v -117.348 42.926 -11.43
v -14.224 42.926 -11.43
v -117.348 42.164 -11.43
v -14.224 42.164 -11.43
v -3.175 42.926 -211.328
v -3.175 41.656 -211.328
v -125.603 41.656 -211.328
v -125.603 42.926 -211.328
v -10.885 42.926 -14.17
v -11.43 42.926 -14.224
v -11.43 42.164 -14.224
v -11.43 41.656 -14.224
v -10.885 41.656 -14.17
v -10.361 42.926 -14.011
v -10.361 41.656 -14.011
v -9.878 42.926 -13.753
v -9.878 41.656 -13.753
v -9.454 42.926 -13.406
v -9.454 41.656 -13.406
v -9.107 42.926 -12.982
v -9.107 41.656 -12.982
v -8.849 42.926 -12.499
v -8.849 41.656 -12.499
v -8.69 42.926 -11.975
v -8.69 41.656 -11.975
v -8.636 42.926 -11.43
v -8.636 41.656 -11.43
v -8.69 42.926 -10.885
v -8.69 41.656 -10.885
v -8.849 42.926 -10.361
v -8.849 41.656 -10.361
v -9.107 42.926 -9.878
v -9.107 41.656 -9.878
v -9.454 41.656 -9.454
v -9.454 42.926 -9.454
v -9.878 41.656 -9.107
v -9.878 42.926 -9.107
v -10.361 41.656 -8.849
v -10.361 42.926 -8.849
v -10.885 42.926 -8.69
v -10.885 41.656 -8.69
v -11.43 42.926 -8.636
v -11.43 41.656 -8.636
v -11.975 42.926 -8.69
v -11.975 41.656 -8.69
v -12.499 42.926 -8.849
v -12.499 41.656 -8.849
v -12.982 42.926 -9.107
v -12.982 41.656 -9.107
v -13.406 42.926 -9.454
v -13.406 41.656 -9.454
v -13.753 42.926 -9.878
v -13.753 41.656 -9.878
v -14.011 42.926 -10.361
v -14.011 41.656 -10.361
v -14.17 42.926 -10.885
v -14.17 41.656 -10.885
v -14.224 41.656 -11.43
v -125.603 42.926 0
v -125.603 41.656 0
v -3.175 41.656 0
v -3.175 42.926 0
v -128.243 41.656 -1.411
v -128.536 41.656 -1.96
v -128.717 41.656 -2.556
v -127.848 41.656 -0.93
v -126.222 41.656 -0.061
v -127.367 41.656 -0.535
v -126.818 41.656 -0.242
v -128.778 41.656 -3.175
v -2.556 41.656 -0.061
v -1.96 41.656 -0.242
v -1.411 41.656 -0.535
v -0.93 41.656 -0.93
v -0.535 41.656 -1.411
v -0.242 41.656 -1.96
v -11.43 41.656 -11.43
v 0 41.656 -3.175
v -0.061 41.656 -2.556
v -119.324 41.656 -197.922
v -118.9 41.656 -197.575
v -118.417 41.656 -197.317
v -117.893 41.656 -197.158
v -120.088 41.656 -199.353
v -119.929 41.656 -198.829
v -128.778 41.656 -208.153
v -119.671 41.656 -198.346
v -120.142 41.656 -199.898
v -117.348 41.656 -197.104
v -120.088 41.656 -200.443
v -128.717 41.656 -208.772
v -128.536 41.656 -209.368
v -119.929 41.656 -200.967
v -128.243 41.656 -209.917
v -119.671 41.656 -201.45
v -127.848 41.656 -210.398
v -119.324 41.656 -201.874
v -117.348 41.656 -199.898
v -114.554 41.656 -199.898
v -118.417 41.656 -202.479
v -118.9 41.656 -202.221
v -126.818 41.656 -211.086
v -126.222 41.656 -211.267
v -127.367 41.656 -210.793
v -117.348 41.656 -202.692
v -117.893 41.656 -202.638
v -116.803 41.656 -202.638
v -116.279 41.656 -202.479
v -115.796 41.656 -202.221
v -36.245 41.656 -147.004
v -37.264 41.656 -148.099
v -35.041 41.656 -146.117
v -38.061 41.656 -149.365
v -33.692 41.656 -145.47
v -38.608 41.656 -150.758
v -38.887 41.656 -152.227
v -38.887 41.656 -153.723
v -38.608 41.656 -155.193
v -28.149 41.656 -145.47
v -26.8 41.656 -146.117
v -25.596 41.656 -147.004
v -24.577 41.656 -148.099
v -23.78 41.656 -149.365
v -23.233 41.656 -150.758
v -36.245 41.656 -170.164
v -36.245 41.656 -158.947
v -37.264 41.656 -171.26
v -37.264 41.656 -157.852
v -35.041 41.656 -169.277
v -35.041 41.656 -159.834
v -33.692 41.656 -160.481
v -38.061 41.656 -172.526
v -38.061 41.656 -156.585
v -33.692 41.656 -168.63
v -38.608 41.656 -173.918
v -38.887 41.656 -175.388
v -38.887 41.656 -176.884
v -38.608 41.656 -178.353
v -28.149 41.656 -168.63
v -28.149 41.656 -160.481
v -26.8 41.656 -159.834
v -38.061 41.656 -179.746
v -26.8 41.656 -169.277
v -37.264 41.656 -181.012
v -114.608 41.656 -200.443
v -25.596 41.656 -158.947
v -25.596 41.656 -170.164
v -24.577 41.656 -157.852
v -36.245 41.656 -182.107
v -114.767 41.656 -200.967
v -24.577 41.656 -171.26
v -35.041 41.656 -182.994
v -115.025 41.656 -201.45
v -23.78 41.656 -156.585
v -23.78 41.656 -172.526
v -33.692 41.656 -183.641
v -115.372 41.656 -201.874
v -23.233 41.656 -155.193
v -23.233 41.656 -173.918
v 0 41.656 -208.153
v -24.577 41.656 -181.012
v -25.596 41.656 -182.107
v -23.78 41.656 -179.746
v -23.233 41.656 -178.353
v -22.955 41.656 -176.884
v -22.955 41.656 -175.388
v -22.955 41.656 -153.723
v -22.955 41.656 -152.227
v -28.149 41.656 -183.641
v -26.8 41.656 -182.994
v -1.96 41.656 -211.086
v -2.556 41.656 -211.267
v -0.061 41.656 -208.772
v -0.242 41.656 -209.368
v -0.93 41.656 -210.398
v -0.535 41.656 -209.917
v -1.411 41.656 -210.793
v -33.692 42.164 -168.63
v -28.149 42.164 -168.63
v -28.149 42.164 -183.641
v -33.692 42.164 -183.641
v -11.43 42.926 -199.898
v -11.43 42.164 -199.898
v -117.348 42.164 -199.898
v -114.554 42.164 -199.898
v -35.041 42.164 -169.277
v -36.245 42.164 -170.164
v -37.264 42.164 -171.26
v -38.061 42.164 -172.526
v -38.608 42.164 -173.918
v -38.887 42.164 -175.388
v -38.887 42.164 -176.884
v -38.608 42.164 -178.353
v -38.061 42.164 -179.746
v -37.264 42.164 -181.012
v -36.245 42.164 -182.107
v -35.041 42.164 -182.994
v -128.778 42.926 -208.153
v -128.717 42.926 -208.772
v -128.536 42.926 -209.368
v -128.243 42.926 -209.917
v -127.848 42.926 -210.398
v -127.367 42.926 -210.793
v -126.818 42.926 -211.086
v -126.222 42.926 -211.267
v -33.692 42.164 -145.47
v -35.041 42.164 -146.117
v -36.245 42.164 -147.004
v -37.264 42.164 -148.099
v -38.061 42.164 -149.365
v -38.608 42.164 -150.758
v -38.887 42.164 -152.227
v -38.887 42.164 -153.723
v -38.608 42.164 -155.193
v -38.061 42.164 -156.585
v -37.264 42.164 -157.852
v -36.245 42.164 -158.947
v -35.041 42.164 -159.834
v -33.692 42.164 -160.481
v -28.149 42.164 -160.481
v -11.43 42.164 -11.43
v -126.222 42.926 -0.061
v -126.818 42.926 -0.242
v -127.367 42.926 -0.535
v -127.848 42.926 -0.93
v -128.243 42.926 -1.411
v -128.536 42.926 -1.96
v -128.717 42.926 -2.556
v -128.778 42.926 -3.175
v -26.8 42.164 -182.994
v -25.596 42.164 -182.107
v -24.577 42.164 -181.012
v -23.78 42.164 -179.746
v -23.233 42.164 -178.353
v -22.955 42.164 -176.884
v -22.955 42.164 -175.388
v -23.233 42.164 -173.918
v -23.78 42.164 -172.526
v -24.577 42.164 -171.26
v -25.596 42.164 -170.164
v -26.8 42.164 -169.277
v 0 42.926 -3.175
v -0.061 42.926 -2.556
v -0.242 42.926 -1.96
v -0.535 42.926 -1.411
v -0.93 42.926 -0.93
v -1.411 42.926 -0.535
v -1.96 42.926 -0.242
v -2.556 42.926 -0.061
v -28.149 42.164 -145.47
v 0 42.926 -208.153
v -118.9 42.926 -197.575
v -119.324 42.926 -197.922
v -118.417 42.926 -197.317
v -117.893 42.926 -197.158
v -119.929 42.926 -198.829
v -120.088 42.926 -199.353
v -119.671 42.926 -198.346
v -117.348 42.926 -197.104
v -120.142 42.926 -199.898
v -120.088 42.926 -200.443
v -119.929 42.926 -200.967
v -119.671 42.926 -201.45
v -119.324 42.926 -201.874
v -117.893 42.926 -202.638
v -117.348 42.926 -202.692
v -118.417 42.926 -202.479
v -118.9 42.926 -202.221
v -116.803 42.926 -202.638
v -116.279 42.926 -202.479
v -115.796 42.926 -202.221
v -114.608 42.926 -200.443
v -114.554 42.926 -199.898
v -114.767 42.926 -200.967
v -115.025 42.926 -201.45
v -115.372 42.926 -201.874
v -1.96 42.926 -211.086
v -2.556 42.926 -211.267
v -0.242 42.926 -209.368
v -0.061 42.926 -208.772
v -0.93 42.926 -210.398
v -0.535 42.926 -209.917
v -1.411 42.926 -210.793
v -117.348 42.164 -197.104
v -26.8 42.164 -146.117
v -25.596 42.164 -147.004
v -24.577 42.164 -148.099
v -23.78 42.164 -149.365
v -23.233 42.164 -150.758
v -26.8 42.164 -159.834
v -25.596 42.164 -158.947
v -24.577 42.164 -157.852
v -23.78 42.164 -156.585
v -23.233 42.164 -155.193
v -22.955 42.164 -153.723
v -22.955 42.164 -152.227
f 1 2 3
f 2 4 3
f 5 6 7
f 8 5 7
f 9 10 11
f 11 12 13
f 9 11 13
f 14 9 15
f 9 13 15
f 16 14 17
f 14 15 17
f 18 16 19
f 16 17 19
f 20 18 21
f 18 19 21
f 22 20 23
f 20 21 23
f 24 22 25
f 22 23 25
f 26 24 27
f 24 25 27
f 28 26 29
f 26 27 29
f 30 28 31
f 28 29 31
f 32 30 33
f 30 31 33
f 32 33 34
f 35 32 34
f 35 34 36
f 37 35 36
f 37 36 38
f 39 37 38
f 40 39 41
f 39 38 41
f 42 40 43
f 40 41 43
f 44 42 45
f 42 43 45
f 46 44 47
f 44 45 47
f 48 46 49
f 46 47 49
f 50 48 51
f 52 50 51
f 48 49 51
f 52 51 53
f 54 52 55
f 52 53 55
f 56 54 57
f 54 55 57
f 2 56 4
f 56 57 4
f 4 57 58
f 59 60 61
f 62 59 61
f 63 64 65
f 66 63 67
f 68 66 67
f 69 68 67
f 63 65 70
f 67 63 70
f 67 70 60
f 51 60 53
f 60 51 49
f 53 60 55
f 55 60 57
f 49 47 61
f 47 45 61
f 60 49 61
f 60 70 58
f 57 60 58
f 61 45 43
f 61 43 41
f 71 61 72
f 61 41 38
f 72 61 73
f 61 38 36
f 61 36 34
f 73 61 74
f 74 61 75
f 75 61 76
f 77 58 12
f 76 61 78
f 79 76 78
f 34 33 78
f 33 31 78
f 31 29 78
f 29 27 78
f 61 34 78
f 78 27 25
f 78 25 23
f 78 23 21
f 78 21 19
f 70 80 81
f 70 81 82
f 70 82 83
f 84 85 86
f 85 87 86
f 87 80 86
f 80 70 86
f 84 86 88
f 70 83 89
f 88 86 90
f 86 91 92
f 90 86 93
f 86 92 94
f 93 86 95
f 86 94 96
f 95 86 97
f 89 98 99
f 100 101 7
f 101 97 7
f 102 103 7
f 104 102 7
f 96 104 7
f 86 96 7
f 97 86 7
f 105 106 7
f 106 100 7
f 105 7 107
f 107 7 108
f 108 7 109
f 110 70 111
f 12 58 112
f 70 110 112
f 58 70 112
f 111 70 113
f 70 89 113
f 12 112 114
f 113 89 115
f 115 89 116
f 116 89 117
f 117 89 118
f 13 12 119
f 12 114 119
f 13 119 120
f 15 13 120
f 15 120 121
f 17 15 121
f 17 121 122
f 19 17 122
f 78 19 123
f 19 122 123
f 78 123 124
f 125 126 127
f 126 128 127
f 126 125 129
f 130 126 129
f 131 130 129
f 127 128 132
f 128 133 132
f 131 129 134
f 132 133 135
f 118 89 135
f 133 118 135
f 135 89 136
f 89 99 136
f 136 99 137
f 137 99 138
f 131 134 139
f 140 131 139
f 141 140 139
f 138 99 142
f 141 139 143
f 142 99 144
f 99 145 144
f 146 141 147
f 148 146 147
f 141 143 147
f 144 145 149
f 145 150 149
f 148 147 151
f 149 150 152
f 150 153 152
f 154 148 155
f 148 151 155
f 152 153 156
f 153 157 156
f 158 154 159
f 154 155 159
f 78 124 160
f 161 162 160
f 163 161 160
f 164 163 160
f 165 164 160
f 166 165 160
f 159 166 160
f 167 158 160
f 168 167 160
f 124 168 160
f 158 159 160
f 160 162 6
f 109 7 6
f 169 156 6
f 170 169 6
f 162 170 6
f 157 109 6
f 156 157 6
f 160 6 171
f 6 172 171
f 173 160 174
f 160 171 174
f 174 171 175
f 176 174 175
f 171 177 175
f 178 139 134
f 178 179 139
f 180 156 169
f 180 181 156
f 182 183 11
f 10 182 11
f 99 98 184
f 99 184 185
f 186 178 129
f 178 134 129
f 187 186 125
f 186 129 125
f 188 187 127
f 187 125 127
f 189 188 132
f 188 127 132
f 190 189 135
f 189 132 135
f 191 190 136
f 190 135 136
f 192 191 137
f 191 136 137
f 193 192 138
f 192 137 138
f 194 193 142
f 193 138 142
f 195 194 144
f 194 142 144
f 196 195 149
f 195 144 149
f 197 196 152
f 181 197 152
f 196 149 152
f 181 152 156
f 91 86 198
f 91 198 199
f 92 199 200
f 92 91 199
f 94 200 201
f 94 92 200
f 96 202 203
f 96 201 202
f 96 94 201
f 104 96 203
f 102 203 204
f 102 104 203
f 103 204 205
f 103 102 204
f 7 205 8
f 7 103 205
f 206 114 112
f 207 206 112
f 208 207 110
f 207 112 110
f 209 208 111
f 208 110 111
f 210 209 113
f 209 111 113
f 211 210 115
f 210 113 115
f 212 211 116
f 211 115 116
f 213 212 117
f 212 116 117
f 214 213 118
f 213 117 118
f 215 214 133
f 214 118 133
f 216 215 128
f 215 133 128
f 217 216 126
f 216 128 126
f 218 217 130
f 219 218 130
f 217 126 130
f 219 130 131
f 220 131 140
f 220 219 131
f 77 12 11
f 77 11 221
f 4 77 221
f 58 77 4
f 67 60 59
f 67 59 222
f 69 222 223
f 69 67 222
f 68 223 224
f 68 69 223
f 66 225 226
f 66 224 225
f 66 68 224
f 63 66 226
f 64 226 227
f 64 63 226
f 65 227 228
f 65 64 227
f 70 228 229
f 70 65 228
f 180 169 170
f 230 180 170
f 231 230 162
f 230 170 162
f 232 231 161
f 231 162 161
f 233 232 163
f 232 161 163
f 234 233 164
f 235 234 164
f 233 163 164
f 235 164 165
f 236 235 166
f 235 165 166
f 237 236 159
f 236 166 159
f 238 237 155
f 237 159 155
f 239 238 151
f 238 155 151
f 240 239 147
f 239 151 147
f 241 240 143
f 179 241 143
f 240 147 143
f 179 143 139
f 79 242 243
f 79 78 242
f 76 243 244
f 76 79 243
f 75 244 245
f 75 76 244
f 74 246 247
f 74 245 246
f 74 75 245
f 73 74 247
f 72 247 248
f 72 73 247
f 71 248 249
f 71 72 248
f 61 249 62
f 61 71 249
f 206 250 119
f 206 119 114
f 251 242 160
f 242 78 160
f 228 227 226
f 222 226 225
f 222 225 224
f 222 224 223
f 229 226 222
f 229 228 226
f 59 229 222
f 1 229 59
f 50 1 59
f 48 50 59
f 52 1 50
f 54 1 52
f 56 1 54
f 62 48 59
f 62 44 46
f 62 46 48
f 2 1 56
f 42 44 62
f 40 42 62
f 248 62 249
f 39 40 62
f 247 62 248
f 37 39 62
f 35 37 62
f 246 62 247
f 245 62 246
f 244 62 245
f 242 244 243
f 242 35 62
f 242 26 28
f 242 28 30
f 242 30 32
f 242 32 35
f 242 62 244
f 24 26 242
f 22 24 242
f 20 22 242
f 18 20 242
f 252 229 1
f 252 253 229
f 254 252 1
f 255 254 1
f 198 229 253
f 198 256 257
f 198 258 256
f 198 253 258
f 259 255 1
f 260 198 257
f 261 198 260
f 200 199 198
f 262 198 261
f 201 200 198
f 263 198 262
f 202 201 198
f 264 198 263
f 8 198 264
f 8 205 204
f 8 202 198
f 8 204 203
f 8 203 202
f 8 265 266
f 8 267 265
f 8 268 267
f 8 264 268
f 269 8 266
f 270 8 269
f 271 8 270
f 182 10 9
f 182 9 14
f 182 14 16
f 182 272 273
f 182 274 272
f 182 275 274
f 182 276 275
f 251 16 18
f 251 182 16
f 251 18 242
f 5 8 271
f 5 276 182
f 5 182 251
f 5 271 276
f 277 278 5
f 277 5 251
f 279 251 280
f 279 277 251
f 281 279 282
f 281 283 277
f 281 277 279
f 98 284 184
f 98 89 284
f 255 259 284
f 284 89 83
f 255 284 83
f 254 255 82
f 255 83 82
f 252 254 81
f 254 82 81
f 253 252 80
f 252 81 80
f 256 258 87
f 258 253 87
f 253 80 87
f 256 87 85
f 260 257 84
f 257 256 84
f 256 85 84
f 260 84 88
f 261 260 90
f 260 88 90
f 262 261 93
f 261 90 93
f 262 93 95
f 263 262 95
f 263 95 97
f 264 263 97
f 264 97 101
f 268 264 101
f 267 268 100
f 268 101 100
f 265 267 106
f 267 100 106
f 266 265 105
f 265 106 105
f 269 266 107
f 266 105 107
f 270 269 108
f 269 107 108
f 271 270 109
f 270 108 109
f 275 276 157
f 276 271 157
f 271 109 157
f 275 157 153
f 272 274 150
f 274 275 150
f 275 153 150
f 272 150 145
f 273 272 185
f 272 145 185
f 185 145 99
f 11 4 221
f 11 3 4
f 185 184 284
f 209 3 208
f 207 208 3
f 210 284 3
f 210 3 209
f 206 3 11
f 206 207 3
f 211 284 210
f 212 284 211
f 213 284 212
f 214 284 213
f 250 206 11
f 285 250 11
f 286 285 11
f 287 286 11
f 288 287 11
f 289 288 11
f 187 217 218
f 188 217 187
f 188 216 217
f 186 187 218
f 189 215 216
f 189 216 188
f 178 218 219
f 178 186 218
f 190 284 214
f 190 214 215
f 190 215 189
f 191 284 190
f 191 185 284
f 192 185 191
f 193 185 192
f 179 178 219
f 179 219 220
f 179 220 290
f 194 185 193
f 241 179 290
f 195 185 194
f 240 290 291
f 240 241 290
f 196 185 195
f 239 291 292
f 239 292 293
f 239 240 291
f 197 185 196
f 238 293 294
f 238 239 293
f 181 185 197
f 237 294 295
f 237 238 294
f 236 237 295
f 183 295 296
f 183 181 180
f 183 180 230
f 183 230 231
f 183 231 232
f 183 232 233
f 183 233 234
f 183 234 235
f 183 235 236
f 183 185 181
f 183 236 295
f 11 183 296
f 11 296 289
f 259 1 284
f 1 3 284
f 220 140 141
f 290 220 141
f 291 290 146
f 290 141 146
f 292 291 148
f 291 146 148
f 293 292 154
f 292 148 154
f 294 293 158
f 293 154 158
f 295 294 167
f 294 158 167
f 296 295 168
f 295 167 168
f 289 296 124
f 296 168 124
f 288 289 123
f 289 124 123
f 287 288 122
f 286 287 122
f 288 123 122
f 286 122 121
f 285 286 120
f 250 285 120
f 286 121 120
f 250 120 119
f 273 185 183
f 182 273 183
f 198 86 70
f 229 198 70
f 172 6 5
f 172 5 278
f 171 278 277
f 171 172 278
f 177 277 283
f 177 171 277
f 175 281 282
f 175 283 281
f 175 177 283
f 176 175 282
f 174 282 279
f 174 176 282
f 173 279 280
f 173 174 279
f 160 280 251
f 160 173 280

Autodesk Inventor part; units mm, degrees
ref_plane "YZ Plane" through (0, 0, 0) normal (1, 0, 0) x (0, 1, 0)
ref_plane "XZ Plane" through (0, 0, 0) normal (0, 1, 0) x (-1, 0, 0)
ref_plane "XY Plane" through (0, 0, 0) normal (0, 0, 1) x (1, 0, 0)
ref_plane "Work Plane1" through (0, 41.656, 0) normal (0, 1, 0) x (1, 0, 0)
sketch "Sketch2" plane through (0, 41.656, 0) normal (0, 1, 0) x (1, 0, 0)
  line L0 (-118.364, 207.264) -> (-10.414, 207.264) projected
  arc A0 (-4.064, 200.914) -> (-10.414, 207.264) centre (-10.414, 200.914) ccw projected
  line L1 (-4.064, 200.914) -> (-4.064, 10.414) projected
  arc A1 (-10.414, 4.064) -> (-4.064, 10.414) centre (-10.414, 10.414) ccw projected
  line L2 (-10.414, 4.064) -> (-118.364, 4.064) projected
  arc A2 (-124.714, 10.414) -> (-118.364, 4.064) centre (-118.364, 10.414) ccw projected
  line L3 (-124.714, 10.414) -> (-124.714, 200.914) projected
  arc A3 (-118.364, 207.264) -> (-124.714, 200.914) centre (-118.364, 200.914) ccw projected
  line L4 (-128.778, 208.153) -> (-128.778, 3.175) projected
  arc A4 (-128.778, 3.175) -> (-125.603, 0) centre (-125.603, 3.175) ccw projected
  line L5 (-125.603, 0) -> (-3.175, 0) projected
  arc A5 (-3.175, 0) -> (0, 3.175) centre (-3.175, 3.175) ccw projected
  line L6 (0, 3.175) -> (0, 208.153) projected
  arc A6 (0, 208.153) -> (-3.175, 211.328) centre (-3.175, 208.153) ccw projected
  line L7 (-3.175, 211.328) -> (-125.603, 211.328) projected
  arc A7 (-125.603, 211.328) -> (-128.778, 208.153) centre (-125.603, 208.153) ccw projected
  circle A8 centre (-117.348, 199.898) radius 2.794 projected
  circle A9 centre (-11.43, 11.43) radius 2.794 projected
  line L8 (-117.348, 199.898) -> (-11.43, 199.898)
  line L9 (-11.43, 199.898) -> (-11.43, 11.43)
  line L10 (-11.43, 11.43) -> (-117.348, 11.43)
  line L11 (-117.348, 11.43) -> (-117.348, 199.898)
  point P0 (0, 0)
extrude "Extrusion5" add sketch "Sketch2" along normal blind 1.27 contours L0 A0 L1 A1 L2 A2 L3 A3 | A7 L7 A6 L6 A5 L5 A4 L4
extrude "Extrusion6" add sketch "Sketch2" along normal blind 0.508 contours L8 L9 A9 L10 L11 A8 | A8 L11 L8 | L9 L10 A9 picked at (-115.5087, 199.6908) picked at (-13.2693, 11.6372)
sketch "Sketch3" plane through (0, 42.164, 0) normal (0, 1, 0) x (1, 0, 0)
  line L0 (-14.224, 11.43) -> (-117.348, 11.43) projected
  line L1 (-114.554, 199.898) -> (-11.43, 199.898) projected
  line L2 (-117.348, 11.43) -> (-62.992, 11.43)
  line L3 (-62.992, 11.43) -> (-62.992, 199.898)
  line L4 (-62.992, 199.898) -> (-117.348, 199.898)
  line L5 (-117.348, 199.898) -> (-117.348, 11.43)
  line L6 (-11.43, 199.898) -> (-62.992, 199.898)
  line L7 (-62.992, 199.898) -> (-62.992, 105.664)
  line L8 (-62.992, 105.664) -> (-11.43, 105.664)
  line L9 (-11.43, 105.664) -> (-11.43, 199.898)
  line L10 (-37.211, 105.664) -> (-62.992, 105.664)
  line L11 (-62.992, 105.664) -> (-62.992, 199.898)
  line L12 (-62.992, 199.898) -> (-37.211, 199.898)
  line L13 (-37.211, 199.898) -> (-37.211, 105.664)
  line L14 (-11.43, 199.898) -> (-11.43, 14.224) projected
  line L15 (-11.43, 199.898) -> (-37.211, 199.898)
  line L16 (-37.211, 199.898) -> (-37.211, 152.781)
  line L17 (-37.211, 152.781) -> (-11.43, 152.781)
  line L18 (-11.43, 152.781) -> (-11.43, 199.898)
  line L19 (-11.43, 105.664) -> (-24.3205, 105.664)
  line L20 (-24.3205, 105.664) -> (-24.3205, 199.898)
  line L21 (-24.3205, 199.898) -> (-11.43, 199.898)
  line L22 (-11.43, 199.898) -> (-11.43, 105.664)
  line L23 (-37.211, 176.3395) -> (-24.3205, 176.3395)
  line L24 (-24.3205, 176.3395) -> (-24.3205, 152.781)
  line L25 (-24.3205, 152.781) -> (-37.211, 152.781)
  line L26 (-37.211, 152.781) -> (-37.211, 176.3395)
  line L27 (-37.211, 105.664) -> (-24.3205, 105.664)
  line L28 (-24.3205, 105.664) -> (-24.3205, 152.781)
  line L29 (-24.3205, 152.781) -> (-37.211, 152.781)
  line L30 (-37.211, 152.781) -> (-37.211, 105.664)
  line L31 (-37.211, 129.2225) -> (-24.3205, 129.2225)
  line L32 (-24.3205, 129.2225) -> (-24.3205, 152.781)
  line L33 (-24.3205, 152.781) -> (-37.211, 152.781)
  line L34 (-37.211, 152.781) -> (-37.211, 129.2225)
  line L35 (-24.3205, 105.664) -> (-30.7657, 105.664)
  line L36 (-30.7657, 105.664) -> (-30.7657, 129.2225)
  line L37 (-30.7657, 129.2225) -> (-24.3205, 129.2225)
  line L38 (-24.3205, 129.2225) -> (-24.3205, 105.664)
  line L39 (-30.7657, 129.2225) -> (-24.3205, 129.2225)
  line L40 (-24.3205, 129.2225) -> (-24.3205, 199.898)
  line L41 (-24.3205, 199.898) -> (-30.7657, 199.898)
  line L42 (-30.7657, 199.898) -> (-30.7657, 129.2225)
  point P0 (0, 0)
sketch "Sketch4" plane through (0, 42.164, 0) normal (0, 1, 0) x (1, 0, 0)
  point P0 (0, 0)
  point P1 (-30.9206, 152.9754)
  point P2 (-30.9206, 176.1357)
hole "Hole1" at (-30.9206, 42.164, -152.9754) at (-30.9206, 42.164, -176.1357) direction (0, -1, 0) diameter 16.002 depth 8.001 tip angle 118
sketch "Sketch5" plane through (0, 42.164, 0) normal (0, 1, 0) x (1, 0, 0)
  circle A0 centre (-30.9206, 152.9754) radius 8.001 projected
  circle A1 centre (-30.9206, 176.1357) radius 8.001 projected
  line L0 (-30.9206, 152.9754) -> (-38.9216, 152.9754)
  line L1 (-30.9206, 152.9754) -> (-22.9196, 152.9754)
  circle A2 centre (-30.9206, 176.1357) radius 8.001 projected
  line L2 (-38.9216, 176.1357) -> (-30.9206, 176.1357)
  line L3 (-30.9206, 176.1357) -> (-22.9196, 176.1357)
  circle A3 centre (-30.9206, 152.9754) radius 7.5057
  circle A4 centre (-30.9206, 176.1357) radius 7.5057
  line L4 (-30.9206, 152.9754) -> (-38.9216, 152.9754)
  line L5 (-38.9216, 152.9754) -> (-38.9216, 160.4811)
  line L6 (-38.9216, 160.4811) -> (-30.9206, 160.4811)
  line L7 (-30.9206, 160.4811) -> (-30.9206, 152.9754)
  line L8 (-30.9206, 152.9754) -> (-22.9196, 152.9754)
  line L9 (-22.9196, 152.9754) -> (-22.9196, 145.4697)
  line L10 (-22.9196, 145.4697) -> (-30.9206, 145.4697)
  line L11 (-30.9206, 145.4697) -> (-30.9206, 152.9754)
  line L12 (-22.9196, 145.4697) -> (-38.9216, 145.4697)
  line L13 (-38.9216, 145.4697) -> (-38.9216, 160.4811)
  line L14 (-38.9216, 160.4811) -> (-22.9196, 160.4811)
  line L15 (-22.9196, 160.4811) -> (-22.9196, 145.4697)
  line L16 (-30.9206, 176.1357) -> (-22.9196, 176.1357)
  line L17 (-22.9196, 176.1357) -> (-22.9196, 168.63)
  line L18 (-22.9196, 168.63) -> (-30.9206, 168.63)
  line L19 (-30.9206, 168.63) -> (-30.9206, 176.1357)
  line L20 (-30.9206, 176.1357) -> (-38.9216, 176.1357)
  line L21 (-38.9216, 176.1357) -> (-38.9216, 183.6414)
  line L22 (-38.9216, 183.6414) -> (-30.9206, 183.6414)
  line L23 (-30.9206, 183.6414) -> (-30.9206, 176.1357)
  line L24 (-38.9216, 183.6414) -> (-22.9196, 183.6414)
  line L25 (-22.9196, 183.6414) -> (-22.9196, 168.63)
  line L26 (-22.9196, 168.63) -> (-38.9216, 168.63)
  line L27 (-38.9216, 168.63) -> (-38.9216, 183.6414)
  circle A5 centre (-30.9206, 152.9754) radius 8.001
  circle A6 centre (-30.9206, 176.1357) radius 8.001
  line L28 (-33.692, 183.6414) -> (-28.1492, 183.6414)
  arc A7 (-28.1492, 183.6414) -> (-33.692, 183.6414) centre (-30.9206, 176.1357) ccw
  arc A8 (-33.692, 168.63) -> (-28.1492, 168.63) centre (-30.9206, 176.1357) ccw
  line L29 (-33.692, 168.63) -> (-28.1492, 168.63)
  arc A9 (-28.1492, 160.4811) -> (-33.692, 160.4811) centre (-30.9206, 152.9754) ccw
  arc A10 (-33.692, 145.4697) -> (-28.1492, 145.4697) centre (-30.9206, 152.9754) ccw
  line L30 (-33.692, 145.4697) -> (-28.1492, 145.4697)
  line L31 (-33.692, 160.4811) -> (-28.1492, 160.4811)
  point P0 (0, 0)
  dimension "d51" = 15.0114
  dimension "d52" = 15.0114
  dimension "d53" = 15.0114
  dimension "d54" = 15.0114
  dimension "d55" = 16.002
  dimension "d56" = 8.001
  dimension "d57" = 7.5057
  dimension "d58" = 7.5057
extrude "Extrusion7" add sketch "Sketch5" against normal blind 0.508 contours L14 L6 A0 | A0 L12 L10 | L24 L22 A1 | A1 L26 L18
properties part number "Lid"
